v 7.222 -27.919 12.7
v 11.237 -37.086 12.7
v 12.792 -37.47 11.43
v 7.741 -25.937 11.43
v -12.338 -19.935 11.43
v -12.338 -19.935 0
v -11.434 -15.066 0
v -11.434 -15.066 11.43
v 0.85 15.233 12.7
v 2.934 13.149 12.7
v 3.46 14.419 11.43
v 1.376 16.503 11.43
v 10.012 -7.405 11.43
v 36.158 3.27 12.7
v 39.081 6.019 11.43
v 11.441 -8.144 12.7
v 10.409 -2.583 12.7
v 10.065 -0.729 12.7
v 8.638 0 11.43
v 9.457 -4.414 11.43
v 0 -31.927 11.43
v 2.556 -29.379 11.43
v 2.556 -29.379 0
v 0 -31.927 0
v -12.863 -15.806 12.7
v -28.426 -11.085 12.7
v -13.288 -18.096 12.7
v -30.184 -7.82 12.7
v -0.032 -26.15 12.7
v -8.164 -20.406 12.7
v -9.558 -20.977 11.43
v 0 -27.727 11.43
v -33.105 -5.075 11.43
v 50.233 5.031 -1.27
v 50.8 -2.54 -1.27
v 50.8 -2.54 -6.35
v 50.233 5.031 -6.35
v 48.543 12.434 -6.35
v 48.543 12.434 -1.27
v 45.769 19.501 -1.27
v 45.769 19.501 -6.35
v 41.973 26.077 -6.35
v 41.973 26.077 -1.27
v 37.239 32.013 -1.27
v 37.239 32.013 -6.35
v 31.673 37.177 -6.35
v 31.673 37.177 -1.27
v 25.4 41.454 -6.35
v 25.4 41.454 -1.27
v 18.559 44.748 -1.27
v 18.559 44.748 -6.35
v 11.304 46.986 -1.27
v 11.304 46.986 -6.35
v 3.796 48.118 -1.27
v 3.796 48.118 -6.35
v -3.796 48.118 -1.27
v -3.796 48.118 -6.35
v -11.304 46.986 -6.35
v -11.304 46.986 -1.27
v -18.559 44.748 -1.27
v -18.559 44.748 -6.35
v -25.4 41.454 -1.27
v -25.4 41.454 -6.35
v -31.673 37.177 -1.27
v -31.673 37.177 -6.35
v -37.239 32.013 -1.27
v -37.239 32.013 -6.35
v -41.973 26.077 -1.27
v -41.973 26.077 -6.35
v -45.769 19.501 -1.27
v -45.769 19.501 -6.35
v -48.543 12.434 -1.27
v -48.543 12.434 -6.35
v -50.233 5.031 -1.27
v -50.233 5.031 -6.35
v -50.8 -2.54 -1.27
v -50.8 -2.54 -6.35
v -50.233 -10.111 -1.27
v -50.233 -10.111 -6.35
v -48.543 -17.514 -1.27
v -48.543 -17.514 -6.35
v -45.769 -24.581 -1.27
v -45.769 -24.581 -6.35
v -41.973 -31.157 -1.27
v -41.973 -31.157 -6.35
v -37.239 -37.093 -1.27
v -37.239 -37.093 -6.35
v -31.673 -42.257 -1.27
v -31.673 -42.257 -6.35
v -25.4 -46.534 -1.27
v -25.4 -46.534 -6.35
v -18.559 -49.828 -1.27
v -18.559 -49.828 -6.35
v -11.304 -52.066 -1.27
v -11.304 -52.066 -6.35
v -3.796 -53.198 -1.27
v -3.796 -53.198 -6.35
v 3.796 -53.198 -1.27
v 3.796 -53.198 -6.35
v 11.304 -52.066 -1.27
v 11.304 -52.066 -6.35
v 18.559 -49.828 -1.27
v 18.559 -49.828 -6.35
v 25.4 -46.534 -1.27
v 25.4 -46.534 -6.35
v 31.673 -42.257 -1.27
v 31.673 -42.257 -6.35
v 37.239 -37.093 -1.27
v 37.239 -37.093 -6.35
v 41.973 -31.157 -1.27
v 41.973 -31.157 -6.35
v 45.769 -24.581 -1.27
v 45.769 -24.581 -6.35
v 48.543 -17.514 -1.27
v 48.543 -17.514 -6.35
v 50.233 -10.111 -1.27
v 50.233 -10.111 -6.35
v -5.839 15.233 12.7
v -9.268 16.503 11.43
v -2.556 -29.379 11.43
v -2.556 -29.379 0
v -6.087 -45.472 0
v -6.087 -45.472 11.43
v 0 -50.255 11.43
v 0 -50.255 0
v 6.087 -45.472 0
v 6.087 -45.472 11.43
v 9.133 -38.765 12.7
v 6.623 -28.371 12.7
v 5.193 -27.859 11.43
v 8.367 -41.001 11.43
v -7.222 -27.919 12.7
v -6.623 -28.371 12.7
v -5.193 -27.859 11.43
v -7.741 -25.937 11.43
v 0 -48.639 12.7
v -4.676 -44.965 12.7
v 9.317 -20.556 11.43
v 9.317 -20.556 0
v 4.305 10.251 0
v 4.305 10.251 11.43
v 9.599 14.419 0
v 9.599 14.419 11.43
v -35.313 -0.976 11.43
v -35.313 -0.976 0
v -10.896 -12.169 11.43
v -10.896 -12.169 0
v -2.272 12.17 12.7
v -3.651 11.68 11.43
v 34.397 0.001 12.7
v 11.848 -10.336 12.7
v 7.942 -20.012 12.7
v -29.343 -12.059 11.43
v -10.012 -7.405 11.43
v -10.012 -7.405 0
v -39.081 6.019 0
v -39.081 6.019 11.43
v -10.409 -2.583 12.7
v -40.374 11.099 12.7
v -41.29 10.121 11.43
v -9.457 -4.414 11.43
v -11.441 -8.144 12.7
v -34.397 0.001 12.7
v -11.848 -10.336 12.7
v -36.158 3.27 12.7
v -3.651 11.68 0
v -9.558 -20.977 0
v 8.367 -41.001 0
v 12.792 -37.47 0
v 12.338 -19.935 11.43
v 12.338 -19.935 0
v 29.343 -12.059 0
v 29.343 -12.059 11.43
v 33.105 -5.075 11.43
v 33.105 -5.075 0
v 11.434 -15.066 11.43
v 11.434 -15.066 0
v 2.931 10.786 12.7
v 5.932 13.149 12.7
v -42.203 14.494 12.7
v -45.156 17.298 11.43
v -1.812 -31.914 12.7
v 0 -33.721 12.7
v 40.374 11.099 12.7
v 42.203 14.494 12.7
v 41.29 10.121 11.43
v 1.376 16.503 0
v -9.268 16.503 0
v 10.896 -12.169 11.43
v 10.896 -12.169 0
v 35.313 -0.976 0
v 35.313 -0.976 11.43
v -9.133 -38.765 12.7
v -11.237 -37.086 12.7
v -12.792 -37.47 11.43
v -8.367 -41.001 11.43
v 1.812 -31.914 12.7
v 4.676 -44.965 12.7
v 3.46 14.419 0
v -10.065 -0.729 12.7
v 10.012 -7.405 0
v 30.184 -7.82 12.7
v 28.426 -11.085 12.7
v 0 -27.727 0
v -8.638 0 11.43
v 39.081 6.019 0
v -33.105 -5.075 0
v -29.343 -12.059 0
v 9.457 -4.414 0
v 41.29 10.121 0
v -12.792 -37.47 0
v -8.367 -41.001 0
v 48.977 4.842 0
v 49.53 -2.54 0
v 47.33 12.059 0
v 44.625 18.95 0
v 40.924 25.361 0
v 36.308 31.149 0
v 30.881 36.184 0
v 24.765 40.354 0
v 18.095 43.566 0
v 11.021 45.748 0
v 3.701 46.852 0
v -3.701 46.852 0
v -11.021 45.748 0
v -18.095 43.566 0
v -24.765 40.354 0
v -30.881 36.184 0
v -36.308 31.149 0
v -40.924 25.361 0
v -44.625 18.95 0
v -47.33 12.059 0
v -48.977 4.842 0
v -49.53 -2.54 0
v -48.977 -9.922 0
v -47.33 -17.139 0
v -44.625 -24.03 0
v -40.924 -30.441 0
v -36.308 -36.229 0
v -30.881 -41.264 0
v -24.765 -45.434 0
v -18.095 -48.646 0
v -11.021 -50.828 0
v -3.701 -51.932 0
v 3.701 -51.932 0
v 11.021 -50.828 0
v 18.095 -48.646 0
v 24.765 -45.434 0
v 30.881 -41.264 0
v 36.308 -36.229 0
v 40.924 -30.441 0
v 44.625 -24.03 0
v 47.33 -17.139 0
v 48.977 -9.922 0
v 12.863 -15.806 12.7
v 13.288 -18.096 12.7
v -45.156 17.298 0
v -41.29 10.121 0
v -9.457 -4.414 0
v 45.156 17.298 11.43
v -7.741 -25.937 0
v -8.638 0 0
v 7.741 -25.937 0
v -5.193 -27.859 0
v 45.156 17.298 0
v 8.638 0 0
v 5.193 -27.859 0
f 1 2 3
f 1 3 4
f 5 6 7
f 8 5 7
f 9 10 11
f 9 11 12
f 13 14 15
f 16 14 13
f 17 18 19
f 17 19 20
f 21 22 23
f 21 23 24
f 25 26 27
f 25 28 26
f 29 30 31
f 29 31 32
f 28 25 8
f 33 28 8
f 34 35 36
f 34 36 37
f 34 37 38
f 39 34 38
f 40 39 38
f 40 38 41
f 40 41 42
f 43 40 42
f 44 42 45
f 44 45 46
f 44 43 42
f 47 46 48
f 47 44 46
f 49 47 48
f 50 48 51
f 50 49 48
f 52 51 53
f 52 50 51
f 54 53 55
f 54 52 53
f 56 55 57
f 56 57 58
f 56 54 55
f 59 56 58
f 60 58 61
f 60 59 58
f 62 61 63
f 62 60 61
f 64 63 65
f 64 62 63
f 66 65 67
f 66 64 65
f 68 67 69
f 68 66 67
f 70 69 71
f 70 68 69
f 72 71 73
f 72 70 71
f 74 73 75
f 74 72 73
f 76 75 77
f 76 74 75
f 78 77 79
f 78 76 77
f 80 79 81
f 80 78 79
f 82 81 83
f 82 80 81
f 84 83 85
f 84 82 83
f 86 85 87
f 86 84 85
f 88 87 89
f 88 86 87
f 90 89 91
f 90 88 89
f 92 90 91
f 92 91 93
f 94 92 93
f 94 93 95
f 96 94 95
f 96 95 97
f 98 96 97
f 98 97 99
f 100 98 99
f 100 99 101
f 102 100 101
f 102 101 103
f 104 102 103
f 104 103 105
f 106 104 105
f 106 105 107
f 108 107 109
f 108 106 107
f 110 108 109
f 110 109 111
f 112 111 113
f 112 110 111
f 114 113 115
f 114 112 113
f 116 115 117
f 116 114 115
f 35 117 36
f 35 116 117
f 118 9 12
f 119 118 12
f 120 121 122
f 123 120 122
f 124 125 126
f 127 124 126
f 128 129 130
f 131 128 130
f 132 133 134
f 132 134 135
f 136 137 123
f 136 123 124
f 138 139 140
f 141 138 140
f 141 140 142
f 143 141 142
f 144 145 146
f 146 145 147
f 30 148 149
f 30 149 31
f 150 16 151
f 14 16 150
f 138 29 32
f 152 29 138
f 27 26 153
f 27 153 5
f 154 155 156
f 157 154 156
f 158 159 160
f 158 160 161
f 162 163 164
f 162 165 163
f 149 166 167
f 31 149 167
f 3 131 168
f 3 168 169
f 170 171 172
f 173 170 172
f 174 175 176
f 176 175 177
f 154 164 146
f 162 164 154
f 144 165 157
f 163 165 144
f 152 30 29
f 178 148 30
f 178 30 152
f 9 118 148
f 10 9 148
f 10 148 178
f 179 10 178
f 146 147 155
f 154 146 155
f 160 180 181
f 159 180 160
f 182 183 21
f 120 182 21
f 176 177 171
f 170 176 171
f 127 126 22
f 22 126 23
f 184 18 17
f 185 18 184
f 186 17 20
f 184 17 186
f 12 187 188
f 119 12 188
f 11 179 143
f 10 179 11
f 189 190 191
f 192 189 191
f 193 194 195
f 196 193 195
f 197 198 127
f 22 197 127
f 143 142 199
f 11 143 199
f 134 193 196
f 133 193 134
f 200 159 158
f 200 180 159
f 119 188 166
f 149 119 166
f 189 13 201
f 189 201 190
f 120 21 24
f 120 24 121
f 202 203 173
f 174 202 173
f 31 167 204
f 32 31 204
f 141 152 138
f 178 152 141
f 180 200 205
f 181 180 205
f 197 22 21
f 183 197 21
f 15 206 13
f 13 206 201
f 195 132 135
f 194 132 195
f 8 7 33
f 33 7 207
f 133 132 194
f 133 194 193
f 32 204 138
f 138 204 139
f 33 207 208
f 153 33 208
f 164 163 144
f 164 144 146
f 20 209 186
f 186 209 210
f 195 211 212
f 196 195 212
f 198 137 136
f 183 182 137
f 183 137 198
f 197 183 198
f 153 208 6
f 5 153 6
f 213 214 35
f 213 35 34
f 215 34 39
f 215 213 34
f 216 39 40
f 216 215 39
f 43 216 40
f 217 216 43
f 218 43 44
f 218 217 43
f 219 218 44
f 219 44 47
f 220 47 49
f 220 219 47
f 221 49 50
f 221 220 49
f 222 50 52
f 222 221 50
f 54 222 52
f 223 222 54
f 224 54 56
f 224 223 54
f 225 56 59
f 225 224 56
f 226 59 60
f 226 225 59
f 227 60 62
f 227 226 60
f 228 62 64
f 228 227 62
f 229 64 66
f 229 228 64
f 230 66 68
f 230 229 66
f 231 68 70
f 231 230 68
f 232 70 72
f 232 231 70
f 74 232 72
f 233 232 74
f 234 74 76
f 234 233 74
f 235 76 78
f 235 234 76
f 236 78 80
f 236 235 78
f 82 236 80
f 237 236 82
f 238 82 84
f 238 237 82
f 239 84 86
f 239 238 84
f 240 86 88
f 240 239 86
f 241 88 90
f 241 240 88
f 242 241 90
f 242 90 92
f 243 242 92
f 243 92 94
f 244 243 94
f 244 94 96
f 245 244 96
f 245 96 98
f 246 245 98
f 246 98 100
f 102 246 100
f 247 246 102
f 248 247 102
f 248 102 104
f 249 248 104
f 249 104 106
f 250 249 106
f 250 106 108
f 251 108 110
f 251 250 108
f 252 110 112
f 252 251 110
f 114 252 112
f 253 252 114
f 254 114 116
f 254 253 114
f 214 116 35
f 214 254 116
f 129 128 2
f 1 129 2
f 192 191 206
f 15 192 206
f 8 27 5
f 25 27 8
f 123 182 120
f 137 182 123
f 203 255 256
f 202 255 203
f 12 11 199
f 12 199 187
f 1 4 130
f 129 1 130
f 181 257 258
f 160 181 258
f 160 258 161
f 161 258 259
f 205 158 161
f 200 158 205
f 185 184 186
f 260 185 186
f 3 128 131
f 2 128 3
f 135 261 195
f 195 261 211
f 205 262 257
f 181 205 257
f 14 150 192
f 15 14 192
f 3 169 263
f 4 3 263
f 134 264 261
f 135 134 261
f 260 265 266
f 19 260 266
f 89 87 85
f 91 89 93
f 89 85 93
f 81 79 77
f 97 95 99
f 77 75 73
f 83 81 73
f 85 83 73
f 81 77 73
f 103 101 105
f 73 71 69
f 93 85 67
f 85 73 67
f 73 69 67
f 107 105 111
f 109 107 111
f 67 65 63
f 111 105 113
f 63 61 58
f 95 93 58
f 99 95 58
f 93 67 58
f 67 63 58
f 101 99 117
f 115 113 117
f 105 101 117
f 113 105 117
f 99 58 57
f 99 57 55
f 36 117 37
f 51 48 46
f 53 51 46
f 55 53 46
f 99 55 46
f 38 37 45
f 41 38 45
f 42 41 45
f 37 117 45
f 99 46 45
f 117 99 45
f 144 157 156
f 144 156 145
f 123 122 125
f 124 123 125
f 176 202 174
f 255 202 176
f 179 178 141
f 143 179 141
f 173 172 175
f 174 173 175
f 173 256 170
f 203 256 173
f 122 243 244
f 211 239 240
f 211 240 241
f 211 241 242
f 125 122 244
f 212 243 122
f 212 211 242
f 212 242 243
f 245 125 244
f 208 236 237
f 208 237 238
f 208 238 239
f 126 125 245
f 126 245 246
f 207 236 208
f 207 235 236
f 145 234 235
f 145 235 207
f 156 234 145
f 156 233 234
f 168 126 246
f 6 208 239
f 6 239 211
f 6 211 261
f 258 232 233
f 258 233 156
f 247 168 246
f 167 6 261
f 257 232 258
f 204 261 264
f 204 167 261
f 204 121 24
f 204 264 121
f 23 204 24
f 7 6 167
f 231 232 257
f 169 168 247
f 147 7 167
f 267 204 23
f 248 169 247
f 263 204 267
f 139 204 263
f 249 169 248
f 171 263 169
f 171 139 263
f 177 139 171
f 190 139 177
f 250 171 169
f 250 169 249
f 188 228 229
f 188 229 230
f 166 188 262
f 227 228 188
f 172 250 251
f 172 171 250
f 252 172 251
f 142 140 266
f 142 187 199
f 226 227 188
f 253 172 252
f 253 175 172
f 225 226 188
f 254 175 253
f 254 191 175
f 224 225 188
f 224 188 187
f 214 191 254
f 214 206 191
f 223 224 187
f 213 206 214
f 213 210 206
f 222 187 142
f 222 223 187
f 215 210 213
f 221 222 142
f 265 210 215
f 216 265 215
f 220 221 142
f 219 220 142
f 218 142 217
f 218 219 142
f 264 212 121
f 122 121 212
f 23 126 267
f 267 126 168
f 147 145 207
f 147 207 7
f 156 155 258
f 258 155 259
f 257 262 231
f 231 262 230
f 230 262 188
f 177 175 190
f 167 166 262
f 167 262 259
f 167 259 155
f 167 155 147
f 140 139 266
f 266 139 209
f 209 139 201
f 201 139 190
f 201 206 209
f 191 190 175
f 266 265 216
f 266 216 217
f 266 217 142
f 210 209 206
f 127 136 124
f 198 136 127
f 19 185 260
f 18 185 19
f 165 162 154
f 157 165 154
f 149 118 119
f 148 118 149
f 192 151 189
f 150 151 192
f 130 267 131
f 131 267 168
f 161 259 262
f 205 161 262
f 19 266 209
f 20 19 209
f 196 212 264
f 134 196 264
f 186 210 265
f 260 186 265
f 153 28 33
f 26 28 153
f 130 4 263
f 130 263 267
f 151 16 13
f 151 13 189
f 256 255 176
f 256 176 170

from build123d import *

# Parameters (mm, degrees)
F1_R     = 50.8
F2_DEPTH = 6.35
F3_DEPTH = 12.7
F4_SIZE  = 1.27


with BuildPart() as f2:
    # F1 (on Top) → F2 (new body)
    with BuildSketch(Plane.XY):
        with Locations((0, -2.54)):
            Circle(F1_R)
    extrude(amount=-F2_DEPTH)

    # F0 (on Top) → F3 (join)
    with BuildSketch(Plane.XY):
        Polygon((-6.086908, -45.471568), (0, -50.254583), (0, -31.927135), (-2.555521, -29.379172), align=None)
        Polygon((-9.557882, -20.976724), (0, -27.727479), (0, 16.502708), (-9.268431, 16.502708), (-3.650971, 11.680054), align=None)
        Polygon((0, 16.502708), (0, -27.727479), (9.31712, -20.555755), (4.304654, 10.251204), (9.598721, 14.418875), (3.459856, 14.418875), (1.376021, 16.502708), align=None)
        Polygon((0, -31.927135), (0, -50.254583), (6.086908, -45.471568), (2.555521, -29.379172), align=None)
        Polygon((-9.457259, -4.413513), (-8.638233, 0), (-45.155544, 17.297892), (-41.290144, 10.121377), align=None)
        Polygon((-33.105214, -5.074794), (-29.343309, -12.059161), (-12.3377, -19.935444), (-11.434127, -15.066333), align=None)
        Polygon((-10.896486, -12.169126), (-10.012336, -7.404675), (-39.080556, 6.019047), (-35.312879, -0.976036), align=None)
        Polygon((-5.192886, -27.859336), (-7.740849, -25.937188), (-12.792072, -37.470073), (-8.366664, -41.001458), align=None)
        Polygon((8.638233, 0), (9.457259, -4.413513), (41.290144, 10.121377), (45.155544, 17.297892), align=None)
        Polygon((10.012336, -7.404675), (10.896486, -12.169126), (35.312879, -0.976036), (39.080556, 6.019047), align=None)
        Polygon((8.366664, -41.001458), (12.792072, -37.470073), (7.740849, -25.937188), (5.192886, -27.859336), align=None)
        Polygon((29.343309, -12.059161), (33.105214, -5.074794), (11.434127, -15.066333), (12.3377, -19.935444), align=None)
    extrude(amount=F3_DEPTH)

    # F4
    f4_edges = [f2.edges().sort_by_distance(p)[0] for p in [
        (-26.896888, 8.648946, 12.7),
        (-43.222844, 13.709634, 12.7),
        (-9.047746, -2.206757, 12.7),
        (-25.373702, 2.853932, 12.7),
        (-24.546446, -0.692814, 12.7),
        (-10.454411, -9.7869, 12.7),
        (-23.104682, -6.572581, 12.7),
        (-37.196717, 2.521506, 12.7),
        (-31.224262, -8.566978, 12.7),
        (-22.269671, -10.070563, 12.7),
        (-20.840504, -15.997303, 12.7),
        (-11.885913, -17.500888, 12.7),
        (9.047746, -2.206757, 12.7),
        (26.896888, 8.648946, 12.7),
        (25.373702, 2.853932, 12.7),
        (43.222844, 13.709634, 12.7),
        (10.454411, -9.7869, 12.7),
        (24.546446, -0.692814, 12.7),
        (23.104682, -6.572581, 12.7),
        (37.196717, 2.521506, 12.7),
        (11.885913, -17.500888, 12.7),
        (22.269671, -10.070563, 12.7),
        (31.224262, -8.566978, 12.7),
        (20.840504, -15.997303, 12.7),
        (-10.26646, -31.70363, 12.7),
        (-6.466867, -26.898262, 12.7),
        (-6.779775, -34.430397, 12.7),
        (-10.579368, -39.235765, 12.7),
        (-3.043454, -47.863076, 12.7),
        (3.043454, -47.863076, 12.7),
        (4.321215, -37.42537, 12.7),
        (-4.321215, -37.42537, 12.7),
        (-1.277761, -30.653154, 12.7),
        (1.277761, -30.653154, 12.7),
        (6.779775, -34.430397, 12.7),
        (6.466867, -26.898262, 12.7),
        (10.26646, -31.70363, 12.7),
        (10.579368, -39.235765, 12.7),
        (-4.778941, -24.352102, 12.7),
        (4.65856, -24.141617, 12.7),
        (-6.604427, -4.648335, 12.7),
        (6.810887, -5.152275, 12.7),
        (-6.459701, 14.091381, 12.7),
        (-3.946205, 16.502708, 12.7),
        (2.417938, 15.460792, 12.7),
        (6.529288, 14.418875, 12.7),
        (6.951687, 12.33504, 12.7),
        (-50.8, -2.54, 0),
    ]]
    chamfer(f4_edges, length=F4_SIZE)


solid = f2.part
